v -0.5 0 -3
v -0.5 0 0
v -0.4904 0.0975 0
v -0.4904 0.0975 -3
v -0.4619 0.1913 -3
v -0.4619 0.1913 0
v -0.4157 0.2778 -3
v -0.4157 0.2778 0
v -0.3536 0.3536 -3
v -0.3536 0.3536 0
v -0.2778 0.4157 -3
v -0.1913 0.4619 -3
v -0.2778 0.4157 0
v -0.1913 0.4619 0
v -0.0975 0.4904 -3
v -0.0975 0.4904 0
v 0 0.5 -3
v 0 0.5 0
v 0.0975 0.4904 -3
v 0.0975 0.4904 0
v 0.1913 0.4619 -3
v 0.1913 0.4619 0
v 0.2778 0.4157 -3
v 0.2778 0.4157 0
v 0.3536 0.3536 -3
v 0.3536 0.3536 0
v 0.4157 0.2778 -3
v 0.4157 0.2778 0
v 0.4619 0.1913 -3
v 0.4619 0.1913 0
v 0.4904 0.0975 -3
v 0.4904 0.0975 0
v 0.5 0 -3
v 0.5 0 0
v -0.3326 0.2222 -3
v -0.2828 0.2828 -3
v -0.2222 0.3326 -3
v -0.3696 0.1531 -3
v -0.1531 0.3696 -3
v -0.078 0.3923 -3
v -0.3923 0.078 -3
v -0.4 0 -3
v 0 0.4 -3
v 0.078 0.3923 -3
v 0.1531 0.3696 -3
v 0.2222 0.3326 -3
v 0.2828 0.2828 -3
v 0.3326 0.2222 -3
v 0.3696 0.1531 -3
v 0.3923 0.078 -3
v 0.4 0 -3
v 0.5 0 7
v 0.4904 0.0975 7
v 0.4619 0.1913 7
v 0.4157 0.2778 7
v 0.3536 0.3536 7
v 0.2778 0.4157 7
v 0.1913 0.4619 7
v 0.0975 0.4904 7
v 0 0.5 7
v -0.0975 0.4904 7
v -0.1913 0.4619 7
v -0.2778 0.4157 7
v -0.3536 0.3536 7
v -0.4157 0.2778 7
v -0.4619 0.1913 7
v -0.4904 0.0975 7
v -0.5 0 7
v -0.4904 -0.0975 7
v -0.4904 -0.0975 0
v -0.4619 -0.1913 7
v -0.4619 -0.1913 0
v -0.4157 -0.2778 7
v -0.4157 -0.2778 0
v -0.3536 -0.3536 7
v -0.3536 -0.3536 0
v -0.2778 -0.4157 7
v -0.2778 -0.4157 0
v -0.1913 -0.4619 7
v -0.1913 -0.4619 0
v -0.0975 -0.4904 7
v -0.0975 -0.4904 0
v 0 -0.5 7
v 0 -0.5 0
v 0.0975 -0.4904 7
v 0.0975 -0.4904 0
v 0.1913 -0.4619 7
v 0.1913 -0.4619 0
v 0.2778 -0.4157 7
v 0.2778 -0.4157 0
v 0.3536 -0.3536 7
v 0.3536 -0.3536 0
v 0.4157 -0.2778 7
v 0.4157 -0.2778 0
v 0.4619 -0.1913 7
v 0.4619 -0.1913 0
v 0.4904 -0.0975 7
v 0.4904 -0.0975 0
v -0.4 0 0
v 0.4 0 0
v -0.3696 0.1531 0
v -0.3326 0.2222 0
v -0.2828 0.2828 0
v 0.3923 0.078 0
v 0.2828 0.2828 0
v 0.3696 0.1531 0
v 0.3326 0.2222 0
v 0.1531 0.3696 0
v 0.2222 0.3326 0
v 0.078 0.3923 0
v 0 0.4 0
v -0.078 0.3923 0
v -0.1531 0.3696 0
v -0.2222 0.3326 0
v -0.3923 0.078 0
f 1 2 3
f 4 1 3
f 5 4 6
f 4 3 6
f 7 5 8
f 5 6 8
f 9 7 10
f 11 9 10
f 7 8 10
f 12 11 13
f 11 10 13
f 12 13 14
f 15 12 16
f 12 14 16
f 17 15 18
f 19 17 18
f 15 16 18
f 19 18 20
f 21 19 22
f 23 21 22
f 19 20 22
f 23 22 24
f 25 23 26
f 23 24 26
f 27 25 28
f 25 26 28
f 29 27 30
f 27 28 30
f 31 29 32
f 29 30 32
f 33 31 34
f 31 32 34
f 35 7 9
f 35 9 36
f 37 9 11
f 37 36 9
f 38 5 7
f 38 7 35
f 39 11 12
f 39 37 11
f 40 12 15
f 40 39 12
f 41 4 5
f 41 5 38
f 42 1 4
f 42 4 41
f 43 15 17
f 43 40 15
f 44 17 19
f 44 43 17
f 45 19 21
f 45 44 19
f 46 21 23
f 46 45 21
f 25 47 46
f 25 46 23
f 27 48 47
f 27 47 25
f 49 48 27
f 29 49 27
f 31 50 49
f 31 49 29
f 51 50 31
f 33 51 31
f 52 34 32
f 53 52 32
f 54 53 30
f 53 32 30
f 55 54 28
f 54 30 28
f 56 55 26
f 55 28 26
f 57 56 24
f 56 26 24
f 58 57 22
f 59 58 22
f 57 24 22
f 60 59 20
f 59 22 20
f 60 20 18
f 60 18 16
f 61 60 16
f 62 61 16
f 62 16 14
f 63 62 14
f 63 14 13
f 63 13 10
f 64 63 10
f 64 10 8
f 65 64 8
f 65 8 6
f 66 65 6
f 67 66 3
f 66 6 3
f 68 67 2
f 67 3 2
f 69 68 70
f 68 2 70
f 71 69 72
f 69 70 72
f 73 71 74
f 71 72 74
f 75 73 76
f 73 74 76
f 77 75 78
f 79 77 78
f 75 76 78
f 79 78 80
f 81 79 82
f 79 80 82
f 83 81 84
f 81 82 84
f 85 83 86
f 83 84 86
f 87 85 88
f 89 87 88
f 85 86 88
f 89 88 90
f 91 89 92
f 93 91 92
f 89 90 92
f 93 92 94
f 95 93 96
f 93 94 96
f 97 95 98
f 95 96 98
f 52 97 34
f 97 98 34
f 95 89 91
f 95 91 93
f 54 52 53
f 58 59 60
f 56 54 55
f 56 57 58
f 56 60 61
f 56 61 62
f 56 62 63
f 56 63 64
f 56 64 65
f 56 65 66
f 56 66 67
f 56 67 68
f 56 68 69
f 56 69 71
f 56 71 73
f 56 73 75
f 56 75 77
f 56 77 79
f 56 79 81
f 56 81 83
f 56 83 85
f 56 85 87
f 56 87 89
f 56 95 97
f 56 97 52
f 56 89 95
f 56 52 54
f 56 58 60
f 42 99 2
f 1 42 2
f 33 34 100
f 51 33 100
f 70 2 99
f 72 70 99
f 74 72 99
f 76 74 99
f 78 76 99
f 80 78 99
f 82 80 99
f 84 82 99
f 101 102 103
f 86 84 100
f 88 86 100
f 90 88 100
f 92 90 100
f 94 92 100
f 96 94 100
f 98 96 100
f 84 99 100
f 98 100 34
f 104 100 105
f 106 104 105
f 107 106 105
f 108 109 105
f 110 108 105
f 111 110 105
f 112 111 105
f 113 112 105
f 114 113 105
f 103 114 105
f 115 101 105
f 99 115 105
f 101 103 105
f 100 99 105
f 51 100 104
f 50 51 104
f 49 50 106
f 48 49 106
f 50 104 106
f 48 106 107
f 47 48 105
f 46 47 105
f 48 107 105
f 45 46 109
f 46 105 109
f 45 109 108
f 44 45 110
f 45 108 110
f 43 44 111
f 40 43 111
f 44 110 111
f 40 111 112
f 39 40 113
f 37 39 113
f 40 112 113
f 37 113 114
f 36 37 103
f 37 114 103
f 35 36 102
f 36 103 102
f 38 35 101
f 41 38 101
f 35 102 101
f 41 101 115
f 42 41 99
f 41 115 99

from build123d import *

# Parameters (mm, degrees)
F0_R     = 0.5
F1_DEPTH = 7
F3_DEPTH = 3


with BuildPart() as f1:
    # F0 (on Top) → F1 (new body)
    with BuildSketch(Plane.XY):
        Circle(F0_R)
    extrude(amount=F1_DEPTH)

    # F2 (on face) → F3 (join)
    with BuildSketch(Plane(origin=(0, 0, 0), x_dir=(1, 0, 0), z_dir=(0, 0, -1))):
        with BuildLine():
            Line((-0.4, 0), (-0.5, 0))
            ThreePointArc((-0.5, 0), (0, -0.5), (0.5, 0))
            Line((0.5, 0), (0.4, 0))
            ThreePointArc((0.4, 0), (0, -0.4), (-0.4, 0))
        make_face()
    extrude(amount=F3_DEPTH)


solid = f1.part
